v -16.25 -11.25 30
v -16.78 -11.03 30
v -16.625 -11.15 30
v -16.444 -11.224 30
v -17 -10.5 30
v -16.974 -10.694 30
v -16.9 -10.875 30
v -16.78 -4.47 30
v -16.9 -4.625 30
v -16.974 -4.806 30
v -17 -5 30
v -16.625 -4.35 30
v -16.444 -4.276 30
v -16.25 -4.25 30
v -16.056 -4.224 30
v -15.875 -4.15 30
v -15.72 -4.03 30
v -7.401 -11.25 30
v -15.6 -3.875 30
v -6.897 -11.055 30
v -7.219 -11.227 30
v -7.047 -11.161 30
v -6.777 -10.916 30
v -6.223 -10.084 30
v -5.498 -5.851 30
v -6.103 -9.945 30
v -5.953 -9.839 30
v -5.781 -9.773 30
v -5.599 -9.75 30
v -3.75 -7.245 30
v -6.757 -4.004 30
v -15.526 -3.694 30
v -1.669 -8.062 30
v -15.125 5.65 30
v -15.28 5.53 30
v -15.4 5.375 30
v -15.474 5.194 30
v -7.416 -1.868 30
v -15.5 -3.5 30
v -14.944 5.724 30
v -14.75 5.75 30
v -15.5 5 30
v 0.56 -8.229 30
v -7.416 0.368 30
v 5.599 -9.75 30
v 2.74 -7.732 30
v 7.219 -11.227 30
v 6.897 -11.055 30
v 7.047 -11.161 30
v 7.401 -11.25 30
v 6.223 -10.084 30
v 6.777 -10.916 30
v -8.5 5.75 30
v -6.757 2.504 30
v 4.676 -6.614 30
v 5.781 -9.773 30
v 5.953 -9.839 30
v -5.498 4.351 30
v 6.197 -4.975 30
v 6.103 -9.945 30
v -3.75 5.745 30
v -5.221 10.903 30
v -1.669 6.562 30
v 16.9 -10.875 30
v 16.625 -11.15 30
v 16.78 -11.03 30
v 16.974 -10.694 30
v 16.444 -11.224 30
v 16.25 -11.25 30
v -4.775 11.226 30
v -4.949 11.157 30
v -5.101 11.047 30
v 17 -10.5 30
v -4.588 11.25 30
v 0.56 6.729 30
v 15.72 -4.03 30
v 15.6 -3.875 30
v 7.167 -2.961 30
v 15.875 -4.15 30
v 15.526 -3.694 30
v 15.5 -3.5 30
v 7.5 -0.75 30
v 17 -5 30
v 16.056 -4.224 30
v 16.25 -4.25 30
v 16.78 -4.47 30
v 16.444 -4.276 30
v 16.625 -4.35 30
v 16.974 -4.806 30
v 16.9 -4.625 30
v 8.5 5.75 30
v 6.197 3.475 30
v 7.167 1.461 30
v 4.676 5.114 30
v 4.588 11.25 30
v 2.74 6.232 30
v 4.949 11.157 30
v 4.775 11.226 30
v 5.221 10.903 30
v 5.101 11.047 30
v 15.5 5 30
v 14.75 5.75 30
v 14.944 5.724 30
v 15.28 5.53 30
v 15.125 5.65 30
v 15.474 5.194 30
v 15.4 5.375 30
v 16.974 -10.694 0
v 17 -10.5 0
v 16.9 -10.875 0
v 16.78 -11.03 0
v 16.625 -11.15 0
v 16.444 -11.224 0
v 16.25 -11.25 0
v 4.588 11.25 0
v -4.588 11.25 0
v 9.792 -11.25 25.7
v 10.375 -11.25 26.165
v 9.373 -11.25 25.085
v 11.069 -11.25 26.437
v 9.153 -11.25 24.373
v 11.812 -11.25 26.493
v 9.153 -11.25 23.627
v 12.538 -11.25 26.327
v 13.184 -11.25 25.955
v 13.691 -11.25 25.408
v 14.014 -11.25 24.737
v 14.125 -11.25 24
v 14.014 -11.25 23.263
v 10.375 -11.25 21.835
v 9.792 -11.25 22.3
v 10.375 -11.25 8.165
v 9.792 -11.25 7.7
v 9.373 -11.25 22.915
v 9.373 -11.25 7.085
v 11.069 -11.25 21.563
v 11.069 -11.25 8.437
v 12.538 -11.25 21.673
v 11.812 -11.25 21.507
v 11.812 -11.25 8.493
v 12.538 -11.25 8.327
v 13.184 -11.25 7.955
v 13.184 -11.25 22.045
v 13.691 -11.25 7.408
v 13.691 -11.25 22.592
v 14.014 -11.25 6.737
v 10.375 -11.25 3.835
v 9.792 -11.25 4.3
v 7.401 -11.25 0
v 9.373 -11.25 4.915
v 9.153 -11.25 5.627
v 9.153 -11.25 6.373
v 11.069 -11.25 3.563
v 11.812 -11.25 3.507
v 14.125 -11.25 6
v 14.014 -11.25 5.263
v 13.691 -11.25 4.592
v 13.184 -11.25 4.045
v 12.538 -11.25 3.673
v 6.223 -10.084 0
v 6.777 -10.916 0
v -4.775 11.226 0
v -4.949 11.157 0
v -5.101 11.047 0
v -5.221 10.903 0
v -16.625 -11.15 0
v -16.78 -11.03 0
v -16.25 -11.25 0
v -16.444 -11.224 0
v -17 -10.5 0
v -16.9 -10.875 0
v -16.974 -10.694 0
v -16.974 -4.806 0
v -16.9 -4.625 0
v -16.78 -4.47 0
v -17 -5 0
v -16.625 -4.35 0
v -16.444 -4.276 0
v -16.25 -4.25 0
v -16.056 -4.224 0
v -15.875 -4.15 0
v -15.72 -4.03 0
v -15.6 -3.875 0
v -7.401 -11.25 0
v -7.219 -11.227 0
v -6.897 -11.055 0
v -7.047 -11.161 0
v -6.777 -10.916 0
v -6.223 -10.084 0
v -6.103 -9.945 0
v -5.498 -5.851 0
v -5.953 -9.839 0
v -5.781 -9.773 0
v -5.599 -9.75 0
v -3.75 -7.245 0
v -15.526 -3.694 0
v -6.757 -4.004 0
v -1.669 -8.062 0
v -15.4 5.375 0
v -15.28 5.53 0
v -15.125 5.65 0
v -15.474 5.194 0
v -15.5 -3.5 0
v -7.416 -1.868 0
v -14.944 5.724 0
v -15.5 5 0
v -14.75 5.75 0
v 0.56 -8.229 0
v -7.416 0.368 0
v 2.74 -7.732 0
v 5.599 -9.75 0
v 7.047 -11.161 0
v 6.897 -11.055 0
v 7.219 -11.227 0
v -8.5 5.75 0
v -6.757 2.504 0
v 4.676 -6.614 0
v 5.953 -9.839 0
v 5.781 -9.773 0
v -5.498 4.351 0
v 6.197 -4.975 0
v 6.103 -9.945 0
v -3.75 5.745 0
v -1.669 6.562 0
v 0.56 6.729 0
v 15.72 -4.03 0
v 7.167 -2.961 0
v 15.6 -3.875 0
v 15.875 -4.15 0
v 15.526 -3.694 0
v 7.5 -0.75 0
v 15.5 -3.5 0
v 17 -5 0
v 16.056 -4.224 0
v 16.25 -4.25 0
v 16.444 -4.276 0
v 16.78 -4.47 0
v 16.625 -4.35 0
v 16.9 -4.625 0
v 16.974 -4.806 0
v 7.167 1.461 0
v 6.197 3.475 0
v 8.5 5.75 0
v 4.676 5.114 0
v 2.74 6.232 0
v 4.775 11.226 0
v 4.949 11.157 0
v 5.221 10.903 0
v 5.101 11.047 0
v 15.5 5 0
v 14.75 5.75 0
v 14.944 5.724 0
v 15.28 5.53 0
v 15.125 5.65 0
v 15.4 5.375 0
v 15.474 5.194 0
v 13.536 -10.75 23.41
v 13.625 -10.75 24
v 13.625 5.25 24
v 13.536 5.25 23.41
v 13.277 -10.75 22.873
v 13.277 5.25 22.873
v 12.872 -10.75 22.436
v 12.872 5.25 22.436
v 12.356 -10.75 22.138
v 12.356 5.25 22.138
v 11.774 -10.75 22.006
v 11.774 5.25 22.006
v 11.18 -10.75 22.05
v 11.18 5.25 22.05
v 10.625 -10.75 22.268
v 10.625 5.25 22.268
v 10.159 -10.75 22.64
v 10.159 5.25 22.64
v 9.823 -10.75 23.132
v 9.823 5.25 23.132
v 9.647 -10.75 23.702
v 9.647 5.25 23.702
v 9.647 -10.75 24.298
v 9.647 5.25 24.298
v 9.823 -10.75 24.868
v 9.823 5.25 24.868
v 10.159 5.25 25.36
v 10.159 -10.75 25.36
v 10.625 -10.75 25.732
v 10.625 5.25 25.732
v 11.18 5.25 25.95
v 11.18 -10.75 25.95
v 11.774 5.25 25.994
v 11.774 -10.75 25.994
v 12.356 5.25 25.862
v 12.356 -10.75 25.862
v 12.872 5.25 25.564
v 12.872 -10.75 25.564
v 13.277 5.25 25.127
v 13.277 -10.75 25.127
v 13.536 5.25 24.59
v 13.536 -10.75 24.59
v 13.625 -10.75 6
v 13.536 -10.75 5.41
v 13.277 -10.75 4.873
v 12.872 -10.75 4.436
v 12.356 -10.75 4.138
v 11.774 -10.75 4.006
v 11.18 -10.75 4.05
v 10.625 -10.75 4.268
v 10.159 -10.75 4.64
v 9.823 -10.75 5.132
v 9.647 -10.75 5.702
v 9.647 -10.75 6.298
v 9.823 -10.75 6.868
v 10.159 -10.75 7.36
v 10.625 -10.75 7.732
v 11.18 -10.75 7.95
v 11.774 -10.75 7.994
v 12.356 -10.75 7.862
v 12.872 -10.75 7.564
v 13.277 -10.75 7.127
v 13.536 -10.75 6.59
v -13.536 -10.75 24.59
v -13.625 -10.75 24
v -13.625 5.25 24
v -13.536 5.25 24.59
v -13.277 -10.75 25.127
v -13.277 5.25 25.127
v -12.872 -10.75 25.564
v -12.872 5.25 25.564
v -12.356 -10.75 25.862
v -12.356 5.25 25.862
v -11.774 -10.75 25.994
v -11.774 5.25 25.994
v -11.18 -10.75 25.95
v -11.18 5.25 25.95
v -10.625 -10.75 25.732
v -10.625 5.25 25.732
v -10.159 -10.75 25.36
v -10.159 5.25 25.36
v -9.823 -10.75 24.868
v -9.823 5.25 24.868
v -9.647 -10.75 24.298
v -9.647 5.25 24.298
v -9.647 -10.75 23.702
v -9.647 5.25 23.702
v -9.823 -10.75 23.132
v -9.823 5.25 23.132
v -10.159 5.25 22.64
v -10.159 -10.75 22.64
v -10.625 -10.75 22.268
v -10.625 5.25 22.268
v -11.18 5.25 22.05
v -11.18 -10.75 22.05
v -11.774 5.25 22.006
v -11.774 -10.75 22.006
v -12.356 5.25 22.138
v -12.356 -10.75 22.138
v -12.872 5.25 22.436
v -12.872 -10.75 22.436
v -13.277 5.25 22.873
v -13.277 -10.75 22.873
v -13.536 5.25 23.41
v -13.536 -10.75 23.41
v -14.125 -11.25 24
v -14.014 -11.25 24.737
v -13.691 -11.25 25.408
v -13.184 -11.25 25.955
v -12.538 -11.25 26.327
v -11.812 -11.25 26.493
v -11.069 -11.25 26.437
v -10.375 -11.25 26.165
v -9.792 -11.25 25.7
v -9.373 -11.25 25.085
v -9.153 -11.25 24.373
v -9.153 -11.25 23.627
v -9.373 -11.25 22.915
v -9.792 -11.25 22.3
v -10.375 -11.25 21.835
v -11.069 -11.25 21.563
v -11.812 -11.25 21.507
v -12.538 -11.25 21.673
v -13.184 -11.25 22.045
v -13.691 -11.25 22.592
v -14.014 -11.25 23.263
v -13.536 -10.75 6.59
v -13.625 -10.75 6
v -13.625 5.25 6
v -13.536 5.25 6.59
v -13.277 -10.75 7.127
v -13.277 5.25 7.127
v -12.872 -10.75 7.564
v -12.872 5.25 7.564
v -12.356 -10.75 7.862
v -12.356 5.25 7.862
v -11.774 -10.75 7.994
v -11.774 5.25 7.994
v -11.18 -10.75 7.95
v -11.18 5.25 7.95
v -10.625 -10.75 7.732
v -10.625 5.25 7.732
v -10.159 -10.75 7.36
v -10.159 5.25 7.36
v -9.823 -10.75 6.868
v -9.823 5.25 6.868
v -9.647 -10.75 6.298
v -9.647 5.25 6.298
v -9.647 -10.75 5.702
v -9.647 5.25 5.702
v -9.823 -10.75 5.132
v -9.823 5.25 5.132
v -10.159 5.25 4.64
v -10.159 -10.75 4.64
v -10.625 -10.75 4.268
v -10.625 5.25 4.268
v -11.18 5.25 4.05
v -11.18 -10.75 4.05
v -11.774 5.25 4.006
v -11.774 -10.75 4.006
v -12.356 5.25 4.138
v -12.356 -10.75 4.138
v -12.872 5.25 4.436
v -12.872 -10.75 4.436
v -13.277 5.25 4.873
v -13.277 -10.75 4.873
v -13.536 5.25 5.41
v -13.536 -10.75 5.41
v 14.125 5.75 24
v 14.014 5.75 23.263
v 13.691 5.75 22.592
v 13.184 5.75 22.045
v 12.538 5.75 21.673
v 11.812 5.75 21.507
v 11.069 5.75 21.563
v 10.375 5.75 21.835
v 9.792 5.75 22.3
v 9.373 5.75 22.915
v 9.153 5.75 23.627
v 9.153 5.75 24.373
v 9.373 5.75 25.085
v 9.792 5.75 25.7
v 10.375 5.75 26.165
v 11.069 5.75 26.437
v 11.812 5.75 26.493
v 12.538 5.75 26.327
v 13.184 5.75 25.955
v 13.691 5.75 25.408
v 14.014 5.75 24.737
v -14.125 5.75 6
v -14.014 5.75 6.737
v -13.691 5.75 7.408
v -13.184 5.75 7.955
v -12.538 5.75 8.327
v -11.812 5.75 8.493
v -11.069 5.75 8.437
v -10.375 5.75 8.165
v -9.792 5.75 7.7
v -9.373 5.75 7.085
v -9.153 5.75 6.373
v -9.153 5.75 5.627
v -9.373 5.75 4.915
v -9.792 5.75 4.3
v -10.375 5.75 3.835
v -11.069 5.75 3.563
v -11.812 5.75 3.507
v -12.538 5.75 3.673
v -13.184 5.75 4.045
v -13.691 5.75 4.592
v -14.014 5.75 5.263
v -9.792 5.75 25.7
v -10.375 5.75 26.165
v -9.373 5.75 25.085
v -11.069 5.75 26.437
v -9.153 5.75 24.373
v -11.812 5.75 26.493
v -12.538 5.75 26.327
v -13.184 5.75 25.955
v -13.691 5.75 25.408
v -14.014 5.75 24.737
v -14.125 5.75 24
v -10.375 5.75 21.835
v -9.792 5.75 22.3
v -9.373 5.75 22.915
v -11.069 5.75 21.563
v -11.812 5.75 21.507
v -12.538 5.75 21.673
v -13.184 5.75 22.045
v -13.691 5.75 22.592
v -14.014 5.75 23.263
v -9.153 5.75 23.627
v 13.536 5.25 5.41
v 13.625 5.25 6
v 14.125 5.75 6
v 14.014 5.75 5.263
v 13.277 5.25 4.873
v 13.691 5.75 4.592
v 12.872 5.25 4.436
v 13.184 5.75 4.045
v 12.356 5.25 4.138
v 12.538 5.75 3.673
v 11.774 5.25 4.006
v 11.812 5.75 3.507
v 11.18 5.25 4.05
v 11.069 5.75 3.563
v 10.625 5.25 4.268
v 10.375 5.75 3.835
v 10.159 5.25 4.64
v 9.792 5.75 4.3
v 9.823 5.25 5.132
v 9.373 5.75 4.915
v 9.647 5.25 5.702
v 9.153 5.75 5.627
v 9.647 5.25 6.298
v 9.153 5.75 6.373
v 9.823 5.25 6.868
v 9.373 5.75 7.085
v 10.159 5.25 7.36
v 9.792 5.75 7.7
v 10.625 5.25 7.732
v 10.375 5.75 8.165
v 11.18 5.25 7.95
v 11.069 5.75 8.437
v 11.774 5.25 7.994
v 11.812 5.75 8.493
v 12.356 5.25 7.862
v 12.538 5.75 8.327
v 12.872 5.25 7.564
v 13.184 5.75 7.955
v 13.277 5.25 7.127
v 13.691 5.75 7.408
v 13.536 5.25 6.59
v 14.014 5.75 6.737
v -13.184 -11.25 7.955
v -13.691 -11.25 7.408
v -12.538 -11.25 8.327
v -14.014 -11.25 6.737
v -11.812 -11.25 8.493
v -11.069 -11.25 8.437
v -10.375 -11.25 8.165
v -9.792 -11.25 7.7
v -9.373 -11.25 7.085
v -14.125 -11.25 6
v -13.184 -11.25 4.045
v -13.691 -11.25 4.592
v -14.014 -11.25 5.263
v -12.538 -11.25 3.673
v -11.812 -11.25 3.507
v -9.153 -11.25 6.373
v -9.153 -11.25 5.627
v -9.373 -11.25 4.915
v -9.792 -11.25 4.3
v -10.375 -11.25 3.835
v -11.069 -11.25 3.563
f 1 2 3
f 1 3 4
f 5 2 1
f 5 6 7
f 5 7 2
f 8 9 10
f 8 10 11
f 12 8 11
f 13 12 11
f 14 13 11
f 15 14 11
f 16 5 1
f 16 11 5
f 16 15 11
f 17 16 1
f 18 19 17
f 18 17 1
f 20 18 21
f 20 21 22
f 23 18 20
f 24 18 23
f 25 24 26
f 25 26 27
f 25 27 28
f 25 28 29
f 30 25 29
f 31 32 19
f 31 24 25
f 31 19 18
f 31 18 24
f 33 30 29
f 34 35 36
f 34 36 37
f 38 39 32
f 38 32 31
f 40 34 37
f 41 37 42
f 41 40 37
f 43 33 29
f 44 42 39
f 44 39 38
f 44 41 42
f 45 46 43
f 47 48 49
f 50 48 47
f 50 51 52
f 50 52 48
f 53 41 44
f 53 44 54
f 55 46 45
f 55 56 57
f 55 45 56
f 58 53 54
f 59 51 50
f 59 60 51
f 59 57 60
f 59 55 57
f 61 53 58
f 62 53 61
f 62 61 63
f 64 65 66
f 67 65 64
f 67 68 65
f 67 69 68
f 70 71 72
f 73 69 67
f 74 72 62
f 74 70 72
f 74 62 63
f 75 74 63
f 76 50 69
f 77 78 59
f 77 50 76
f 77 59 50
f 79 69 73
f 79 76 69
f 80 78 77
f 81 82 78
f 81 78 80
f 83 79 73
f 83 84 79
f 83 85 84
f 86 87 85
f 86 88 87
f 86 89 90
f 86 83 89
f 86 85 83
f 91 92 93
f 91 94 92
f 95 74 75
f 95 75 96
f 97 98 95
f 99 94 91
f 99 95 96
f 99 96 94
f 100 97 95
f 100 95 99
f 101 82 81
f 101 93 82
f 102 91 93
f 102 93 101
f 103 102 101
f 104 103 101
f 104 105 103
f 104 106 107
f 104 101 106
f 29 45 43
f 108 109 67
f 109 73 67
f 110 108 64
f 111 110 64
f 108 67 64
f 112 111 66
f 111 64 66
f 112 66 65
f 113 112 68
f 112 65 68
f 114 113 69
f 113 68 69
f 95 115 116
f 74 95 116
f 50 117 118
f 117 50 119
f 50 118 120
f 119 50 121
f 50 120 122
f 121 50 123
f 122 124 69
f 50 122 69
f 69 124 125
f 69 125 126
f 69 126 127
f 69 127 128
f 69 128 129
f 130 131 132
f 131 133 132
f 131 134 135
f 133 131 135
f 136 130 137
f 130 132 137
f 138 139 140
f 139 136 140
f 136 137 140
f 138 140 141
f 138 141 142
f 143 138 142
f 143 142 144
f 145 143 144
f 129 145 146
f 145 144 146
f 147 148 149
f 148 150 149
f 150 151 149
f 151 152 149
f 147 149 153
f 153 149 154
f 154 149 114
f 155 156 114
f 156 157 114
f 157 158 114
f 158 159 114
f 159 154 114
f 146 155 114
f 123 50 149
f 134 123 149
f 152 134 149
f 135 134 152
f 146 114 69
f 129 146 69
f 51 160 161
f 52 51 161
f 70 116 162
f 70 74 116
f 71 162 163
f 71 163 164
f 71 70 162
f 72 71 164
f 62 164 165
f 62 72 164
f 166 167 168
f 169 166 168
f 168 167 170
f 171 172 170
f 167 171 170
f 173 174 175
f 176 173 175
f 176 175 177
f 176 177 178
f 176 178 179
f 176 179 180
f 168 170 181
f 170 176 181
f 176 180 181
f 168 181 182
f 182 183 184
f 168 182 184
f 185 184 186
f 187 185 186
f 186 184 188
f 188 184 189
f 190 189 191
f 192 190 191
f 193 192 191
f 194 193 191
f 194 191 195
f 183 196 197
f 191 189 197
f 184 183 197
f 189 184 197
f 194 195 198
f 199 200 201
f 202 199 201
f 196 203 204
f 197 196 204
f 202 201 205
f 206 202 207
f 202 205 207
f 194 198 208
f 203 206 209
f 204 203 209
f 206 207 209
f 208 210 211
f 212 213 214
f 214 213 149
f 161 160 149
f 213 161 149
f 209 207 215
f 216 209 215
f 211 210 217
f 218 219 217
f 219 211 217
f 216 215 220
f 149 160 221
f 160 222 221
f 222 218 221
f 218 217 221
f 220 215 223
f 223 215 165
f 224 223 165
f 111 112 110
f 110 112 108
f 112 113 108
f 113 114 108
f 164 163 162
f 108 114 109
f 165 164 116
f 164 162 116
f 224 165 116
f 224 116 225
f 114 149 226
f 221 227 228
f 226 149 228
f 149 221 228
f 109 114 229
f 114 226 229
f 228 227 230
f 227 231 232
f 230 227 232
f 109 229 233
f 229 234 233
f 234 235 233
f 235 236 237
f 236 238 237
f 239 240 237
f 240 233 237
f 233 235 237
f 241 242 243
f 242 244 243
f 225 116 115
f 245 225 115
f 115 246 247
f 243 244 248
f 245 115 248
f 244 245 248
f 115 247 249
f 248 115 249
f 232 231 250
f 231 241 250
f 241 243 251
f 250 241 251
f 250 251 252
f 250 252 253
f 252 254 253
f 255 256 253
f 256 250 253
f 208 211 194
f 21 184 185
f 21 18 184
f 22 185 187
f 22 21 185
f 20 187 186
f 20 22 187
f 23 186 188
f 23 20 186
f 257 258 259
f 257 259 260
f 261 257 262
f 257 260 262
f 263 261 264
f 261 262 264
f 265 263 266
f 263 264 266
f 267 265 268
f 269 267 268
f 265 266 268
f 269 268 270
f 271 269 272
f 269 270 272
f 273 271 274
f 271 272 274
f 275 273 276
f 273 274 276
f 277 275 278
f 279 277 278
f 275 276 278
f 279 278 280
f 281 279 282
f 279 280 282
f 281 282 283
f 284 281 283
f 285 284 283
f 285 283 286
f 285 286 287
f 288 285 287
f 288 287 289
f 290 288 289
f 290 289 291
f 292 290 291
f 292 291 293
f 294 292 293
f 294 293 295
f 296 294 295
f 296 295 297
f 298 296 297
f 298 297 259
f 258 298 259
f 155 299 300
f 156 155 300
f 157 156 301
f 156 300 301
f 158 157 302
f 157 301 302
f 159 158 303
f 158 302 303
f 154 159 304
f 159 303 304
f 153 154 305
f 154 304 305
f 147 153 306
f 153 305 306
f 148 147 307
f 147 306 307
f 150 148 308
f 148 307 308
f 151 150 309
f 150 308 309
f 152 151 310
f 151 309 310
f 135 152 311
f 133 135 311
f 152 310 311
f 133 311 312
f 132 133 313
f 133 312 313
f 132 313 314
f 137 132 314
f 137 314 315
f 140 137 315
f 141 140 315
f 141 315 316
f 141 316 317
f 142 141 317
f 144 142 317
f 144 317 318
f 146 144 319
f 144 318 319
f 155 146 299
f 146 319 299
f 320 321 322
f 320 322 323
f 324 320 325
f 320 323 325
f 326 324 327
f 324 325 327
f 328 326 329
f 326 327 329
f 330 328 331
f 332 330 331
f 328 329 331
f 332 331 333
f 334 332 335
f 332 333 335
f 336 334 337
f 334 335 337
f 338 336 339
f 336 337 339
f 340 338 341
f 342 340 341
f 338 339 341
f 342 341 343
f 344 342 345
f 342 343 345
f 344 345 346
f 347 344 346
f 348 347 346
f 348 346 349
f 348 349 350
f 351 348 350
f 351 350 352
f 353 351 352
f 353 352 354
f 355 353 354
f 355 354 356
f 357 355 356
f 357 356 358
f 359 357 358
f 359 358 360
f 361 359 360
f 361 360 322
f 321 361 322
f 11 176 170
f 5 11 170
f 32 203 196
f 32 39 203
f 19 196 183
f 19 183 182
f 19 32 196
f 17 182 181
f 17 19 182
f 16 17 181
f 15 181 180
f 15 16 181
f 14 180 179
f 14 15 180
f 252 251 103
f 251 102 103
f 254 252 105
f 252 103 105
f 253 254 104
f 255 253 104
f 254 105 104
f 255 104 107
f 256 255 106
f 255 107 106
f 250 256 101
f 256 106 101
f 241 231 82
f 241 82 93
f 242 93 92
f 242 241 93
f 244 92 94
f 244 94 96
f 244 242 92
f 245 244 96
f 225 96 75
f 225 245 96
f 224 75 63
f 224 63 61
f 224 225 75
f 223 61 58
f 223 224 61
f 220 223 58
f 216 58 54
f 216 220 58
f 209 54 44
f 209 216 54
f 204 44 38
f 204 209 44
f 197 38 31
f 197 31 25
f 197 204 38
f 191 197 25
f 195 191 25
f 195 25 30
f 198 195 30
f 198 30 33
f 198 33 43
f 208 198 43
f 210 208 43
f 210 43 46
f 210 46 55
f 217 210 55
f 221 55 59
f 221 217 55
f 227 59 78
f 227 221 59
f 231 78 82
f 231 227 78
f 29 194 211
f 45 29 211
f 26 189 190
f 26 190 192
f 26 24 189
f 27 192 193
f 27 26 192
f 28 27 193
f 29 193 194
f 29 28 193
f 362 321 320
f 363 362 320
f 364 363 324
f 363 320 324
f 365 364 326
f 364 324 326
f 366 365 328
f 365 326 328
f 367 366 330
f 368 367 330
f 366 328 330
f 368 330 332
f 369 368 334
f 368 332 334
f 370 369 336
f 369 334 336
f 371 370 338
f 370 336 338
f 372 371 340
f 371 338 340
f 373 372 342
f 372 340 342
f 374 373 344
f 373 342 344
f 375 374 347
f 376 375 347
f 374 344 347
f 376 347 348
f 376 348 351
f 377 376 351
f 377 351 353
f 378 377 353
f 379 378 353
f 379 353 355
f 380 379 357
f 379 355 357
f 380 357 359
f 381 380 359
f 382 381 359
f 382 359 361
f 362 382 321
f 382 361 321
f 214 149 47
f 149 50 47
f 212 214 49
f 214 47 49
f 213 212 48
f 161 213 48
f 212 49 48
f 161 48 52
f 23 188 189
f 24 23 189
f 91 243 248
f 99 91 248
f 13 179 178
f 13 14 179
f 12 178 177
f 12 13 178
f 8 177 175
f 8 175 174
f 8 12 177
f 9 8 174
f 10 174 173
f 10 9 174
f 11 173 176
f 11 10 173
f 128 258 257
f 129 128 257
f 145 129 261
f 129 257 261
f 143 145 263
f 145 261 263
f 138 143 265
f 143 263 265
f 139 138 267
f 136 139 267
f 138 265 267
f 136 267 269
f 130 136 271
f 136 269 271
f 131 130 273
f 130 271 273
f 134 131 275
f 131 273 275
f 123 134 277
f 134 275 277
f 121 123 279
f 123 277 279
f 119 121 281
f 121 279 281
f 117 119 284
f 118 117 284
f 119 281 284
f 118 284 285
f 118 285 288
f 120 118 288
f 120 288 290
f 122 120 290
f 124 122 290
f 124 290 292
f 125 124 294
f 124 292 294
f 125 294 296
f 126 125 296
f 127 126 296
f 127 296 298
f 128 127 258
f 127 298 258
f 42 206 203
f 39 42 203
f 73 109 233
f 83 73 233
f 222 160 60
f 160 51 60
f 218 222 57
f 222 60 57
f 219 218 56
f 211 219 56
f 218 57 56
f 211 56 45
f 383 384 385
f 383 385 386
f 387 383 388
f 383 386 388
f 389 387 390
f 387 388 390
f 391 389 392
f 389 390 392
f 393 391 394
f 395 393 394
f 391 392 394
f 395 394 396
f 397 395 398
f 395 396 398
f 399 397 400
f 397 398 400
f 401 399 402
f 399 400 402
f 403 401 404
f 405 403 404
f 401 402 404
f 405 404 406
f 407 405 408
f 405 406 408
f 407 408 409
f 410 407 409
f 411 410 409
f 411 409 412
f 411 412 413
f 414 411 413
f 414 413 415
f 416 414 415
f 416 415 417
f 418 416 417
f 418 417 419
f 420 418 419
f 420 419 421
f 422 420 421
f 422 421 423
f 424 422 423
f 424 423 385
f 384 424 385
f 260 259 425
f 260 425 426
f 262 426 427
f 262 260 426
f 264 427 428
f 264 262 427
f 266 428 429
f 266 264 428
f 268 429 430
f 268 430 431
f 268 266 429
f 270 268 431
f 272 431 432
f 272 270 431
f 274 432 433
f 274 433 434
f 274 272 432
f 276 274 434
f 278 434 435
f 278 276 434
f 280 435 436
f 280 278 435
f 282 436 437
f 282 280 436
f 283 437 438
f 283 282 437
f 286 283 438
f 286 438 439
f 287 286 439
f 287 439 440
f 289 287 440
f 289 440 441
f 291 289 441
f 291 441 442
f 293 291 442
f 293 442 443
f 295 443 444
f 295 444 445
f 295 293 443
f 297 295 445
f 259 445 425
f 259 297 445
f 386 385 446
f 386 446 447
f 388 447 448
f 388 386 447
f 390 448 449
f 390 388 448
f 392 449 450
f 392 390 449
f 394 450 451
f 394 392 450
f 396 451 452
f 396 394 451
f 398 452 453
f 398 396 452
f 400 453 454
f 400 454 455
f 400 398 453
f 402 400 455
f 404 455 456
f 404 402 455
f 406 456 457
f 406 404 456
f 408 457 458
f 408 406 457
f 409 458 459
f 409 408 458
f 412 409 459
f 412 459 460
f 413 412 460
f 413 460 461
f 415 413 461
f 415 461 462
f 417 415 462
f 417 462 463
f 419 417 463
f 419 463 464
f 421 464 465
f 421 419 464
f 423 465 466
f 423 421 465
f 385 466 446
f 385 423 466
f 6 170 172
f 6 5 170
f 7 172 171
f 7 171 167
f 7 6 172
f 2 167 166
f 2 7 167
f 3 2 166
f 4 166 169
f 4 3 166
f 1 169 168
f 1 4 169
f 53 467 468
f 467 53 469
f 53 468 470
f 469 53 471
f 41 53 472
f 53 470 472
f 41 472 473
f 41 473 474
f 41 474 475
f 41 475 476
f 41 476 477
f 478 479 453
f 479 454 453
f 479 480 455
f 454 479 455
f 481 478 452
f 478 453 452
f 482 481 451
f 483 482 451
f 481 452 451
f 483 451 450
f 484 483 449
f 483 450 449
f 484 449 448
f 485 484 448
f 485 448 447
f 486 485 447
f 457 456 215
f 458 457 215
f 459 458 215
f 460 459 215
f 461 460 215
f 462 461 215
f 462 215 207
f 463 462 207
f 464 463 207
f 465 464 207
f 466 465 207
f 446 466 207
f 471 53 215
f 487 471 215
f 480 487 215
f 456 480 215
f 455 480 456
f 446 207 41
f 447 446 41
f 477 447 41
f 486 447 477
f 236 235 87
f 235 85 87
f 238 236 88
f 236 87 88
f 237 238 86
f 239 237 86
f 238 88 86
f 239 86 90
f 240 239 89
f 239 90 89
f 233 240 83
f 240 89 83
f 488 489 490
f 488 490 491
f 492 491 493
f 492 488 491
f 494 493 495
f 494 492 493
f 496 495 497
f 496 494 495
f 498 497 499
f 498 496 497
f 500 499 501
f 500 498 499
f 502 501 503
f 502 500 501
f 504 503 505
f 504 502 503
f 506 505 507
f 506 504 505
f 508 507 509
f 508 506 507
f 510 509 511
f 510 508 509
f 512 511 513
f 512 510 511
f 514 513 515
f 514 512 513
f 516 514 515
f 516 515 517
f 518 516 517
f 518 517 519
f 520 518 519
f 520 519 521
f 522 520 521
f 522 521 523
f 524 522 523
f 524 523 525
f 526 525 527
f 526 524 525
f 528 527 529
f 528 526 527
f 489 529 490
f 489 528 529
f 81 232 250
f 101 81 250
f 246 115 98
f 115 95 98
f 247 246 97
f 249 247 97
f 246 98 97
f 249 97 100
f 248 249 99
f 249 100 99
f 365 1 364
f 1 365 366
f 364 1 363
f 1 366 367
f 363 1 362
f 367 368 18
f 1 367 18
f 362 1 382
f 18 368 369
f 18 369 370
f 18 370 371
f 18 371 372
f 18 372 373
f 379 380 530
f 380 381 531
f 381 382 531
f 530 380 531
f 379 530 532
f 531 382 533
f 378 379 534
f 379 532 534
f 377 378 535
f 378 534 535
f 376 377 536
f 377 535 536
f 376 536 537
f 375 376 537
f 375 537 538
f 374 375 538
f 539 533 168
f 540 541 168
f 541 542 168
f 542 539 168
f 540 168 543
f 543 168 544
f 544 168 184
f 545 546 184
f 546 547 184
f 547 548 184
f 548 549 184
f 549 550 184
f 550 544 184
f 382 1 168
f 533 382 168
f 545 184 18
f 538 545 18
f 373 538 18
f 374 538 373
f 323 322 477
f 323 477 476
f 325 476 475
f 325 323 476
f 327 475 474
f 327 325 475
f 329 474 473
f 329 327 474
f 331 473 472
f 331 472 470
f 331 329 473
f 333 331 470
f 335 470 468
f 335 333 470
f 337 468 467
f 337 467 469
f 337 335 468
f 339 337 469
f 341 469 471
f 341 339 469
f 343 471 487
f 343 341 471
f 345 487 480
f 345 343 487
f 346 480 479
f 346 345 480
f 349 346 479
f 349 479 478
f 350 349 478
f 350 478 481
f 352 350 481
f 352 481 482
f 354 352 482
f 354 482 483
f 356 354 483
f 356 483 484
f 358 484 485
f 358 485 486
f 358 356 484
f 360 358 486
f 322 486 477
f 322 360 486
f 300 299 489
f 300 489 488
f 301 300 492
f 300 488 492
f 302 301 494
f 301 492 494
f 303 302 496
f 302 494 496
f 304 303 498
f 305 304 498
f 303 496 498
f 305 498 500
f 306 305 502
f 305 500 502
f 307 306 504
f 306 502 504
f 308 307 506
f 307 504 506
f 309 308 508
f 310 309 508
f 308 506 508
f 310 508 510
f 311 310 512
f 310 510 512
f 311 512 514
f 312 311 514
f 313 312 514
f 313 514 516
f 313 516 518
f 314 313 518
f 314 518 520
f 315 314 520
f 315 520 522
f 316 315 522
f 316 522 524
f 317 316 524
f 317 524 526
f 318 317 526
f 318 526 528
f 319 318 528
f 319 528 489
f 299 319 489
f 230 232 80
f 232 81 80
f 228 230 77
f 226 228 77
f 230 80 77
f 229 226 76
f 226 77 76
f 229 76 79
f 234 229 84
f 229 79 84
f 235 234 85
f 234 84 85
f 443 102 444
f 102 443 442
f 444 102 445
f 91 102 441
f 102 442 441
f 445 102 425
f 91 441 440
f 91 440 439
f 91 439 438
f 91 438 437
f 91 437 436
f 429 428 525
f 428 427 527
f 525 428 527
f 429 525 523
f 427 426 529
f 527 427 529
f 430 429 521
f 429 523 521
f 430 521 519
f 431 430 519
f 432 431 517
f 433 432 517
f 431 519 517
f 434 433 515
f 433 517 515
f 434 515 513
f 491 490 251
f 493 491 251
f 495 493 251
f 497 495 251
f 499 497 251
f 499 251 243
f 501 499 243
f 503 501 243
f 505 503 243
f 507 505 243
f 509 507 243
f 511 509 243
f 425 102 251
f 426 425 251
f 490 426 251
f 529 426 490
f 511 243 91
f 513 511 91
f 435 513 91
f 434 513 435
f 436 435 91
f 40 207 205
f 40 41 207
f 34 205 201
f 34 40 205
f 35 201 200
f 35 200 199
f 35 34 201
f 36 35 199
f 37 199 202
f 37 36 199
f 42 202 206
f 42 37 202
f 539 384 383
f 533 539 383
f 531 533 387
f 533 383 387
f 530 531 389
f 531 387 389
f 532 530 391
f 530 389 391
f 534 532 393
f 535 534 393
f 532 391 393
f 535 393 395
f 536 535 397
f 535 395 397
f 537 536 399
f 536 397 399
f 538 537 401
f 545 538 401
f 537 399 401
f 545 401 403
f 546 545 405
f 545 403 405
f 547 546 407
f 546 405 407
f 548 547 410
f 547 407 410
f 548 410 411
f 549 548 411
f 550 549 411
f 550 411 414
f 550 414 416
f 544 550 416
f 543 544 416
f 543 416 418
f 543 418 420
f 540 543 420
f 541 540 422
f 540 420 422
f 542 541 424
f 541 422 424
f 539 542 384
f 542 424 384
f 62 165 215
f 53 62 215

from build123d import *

# Parameters (mm, degrees)
SKETCH_1_R          = 7.5
EXTRUDE_1_DEPTH     = 30
FILLET_1_R          = 0.75
SKETCH_2_R          = 2
CUT_EXTRUDE_1_DEPTH = 39.444765573
CHAMFER_1_SIZE      = 0.5


with BuildPart() as part:
    # 草图1 → 凸台-拉伸1 (new body)
    with BuildSketch(Plane.XY):
        Polygon((5, 11.25), (-5, 11.25), (-8.5, 5.75), (-15.5, 5.75), (-15.5, -4.25), (-17, -4.25), (-17, -11.25), (-7, -11.25), (-6, -9.75), (6, -9.75), (7, -11.25), (17, -11.25), (17, -4.25), (15.5, -4.25), (15.5, 5.75), (8.5, 5.75), align=None)
        with Locations((0, -0.75)):
            Circle(SKETCH_1_R, mode=Mode.SUBTRACT)
    extrude(amount=EXTRUDE_1_DEPTH)

    # 圆角1
    fillet_1_edges = [part.edges().sort_by_distance(p)[0] for p in [
        (-17, -11.25, 15),
        (-7, -11.25, 15),
        (-6, -9.75, 15),
        (7, -11.25, 15),
        (6, -9.75, 15),
        (17, -11.25, 15),
        (17, -4.25, 15),
        (15.5, -4.25, 15),
        (15.5, 5.75, 15),
        (5, 11.25, 15),
        (-5, 11.25, 15),
        (-17, -4.25, 15),
        (-15.5, -4.25, 15),
        (-15.5, 5.75, 15),
    ]]
    fillet(fillet_1_edges, radius=FILLET_1_R - 0.0001)  # a hair under: the kernel refuses the full size

    # 草图2 → 切除-拉伸1 (cut, through all)
    with BuildSketch(Plane(origin=(0, 5.75, 0), x_dir=(1, 0, 0), z_dir=(0, 1, 0))):
        with Locations(Location((-11.625, -6, 0), (0, 0, 180))):
            Circle(SKETCH_2_R)
        with Locations(Location((-11.625, -24, 0), (0, 0, 180))):
            Circle(SKETCH_2_R)
        with Locations((11.625, -24)):
            Circle(SKETCH_2_R)
        with Locations((11.625, -6)):
            Circle(SKETCH_2_R)
    extrude(amount=-CUT_EXTRUDE_1_DEPTH, mode=Mode.SUBTRACT)

    # 倒角1
    chamfer_1_edges = [part.edges().sort_by_distance(p)[0] for p in [
        (-9.625, -11.25, 24),
        (-9.625, 5.75, 24),
        (9.625, -11.25, 6),
        (9.625, 5.75, 6),
        (-9.625, -11.25, 6),
        (-9.625, 5.75, 6),
        (9.625, -11.25, 24),
        (9.625, 5.75, 24),
    ]]
    chamfer(chamfer_1_edges, length=CHAMFER_1_SIZE)


solid = part.part
